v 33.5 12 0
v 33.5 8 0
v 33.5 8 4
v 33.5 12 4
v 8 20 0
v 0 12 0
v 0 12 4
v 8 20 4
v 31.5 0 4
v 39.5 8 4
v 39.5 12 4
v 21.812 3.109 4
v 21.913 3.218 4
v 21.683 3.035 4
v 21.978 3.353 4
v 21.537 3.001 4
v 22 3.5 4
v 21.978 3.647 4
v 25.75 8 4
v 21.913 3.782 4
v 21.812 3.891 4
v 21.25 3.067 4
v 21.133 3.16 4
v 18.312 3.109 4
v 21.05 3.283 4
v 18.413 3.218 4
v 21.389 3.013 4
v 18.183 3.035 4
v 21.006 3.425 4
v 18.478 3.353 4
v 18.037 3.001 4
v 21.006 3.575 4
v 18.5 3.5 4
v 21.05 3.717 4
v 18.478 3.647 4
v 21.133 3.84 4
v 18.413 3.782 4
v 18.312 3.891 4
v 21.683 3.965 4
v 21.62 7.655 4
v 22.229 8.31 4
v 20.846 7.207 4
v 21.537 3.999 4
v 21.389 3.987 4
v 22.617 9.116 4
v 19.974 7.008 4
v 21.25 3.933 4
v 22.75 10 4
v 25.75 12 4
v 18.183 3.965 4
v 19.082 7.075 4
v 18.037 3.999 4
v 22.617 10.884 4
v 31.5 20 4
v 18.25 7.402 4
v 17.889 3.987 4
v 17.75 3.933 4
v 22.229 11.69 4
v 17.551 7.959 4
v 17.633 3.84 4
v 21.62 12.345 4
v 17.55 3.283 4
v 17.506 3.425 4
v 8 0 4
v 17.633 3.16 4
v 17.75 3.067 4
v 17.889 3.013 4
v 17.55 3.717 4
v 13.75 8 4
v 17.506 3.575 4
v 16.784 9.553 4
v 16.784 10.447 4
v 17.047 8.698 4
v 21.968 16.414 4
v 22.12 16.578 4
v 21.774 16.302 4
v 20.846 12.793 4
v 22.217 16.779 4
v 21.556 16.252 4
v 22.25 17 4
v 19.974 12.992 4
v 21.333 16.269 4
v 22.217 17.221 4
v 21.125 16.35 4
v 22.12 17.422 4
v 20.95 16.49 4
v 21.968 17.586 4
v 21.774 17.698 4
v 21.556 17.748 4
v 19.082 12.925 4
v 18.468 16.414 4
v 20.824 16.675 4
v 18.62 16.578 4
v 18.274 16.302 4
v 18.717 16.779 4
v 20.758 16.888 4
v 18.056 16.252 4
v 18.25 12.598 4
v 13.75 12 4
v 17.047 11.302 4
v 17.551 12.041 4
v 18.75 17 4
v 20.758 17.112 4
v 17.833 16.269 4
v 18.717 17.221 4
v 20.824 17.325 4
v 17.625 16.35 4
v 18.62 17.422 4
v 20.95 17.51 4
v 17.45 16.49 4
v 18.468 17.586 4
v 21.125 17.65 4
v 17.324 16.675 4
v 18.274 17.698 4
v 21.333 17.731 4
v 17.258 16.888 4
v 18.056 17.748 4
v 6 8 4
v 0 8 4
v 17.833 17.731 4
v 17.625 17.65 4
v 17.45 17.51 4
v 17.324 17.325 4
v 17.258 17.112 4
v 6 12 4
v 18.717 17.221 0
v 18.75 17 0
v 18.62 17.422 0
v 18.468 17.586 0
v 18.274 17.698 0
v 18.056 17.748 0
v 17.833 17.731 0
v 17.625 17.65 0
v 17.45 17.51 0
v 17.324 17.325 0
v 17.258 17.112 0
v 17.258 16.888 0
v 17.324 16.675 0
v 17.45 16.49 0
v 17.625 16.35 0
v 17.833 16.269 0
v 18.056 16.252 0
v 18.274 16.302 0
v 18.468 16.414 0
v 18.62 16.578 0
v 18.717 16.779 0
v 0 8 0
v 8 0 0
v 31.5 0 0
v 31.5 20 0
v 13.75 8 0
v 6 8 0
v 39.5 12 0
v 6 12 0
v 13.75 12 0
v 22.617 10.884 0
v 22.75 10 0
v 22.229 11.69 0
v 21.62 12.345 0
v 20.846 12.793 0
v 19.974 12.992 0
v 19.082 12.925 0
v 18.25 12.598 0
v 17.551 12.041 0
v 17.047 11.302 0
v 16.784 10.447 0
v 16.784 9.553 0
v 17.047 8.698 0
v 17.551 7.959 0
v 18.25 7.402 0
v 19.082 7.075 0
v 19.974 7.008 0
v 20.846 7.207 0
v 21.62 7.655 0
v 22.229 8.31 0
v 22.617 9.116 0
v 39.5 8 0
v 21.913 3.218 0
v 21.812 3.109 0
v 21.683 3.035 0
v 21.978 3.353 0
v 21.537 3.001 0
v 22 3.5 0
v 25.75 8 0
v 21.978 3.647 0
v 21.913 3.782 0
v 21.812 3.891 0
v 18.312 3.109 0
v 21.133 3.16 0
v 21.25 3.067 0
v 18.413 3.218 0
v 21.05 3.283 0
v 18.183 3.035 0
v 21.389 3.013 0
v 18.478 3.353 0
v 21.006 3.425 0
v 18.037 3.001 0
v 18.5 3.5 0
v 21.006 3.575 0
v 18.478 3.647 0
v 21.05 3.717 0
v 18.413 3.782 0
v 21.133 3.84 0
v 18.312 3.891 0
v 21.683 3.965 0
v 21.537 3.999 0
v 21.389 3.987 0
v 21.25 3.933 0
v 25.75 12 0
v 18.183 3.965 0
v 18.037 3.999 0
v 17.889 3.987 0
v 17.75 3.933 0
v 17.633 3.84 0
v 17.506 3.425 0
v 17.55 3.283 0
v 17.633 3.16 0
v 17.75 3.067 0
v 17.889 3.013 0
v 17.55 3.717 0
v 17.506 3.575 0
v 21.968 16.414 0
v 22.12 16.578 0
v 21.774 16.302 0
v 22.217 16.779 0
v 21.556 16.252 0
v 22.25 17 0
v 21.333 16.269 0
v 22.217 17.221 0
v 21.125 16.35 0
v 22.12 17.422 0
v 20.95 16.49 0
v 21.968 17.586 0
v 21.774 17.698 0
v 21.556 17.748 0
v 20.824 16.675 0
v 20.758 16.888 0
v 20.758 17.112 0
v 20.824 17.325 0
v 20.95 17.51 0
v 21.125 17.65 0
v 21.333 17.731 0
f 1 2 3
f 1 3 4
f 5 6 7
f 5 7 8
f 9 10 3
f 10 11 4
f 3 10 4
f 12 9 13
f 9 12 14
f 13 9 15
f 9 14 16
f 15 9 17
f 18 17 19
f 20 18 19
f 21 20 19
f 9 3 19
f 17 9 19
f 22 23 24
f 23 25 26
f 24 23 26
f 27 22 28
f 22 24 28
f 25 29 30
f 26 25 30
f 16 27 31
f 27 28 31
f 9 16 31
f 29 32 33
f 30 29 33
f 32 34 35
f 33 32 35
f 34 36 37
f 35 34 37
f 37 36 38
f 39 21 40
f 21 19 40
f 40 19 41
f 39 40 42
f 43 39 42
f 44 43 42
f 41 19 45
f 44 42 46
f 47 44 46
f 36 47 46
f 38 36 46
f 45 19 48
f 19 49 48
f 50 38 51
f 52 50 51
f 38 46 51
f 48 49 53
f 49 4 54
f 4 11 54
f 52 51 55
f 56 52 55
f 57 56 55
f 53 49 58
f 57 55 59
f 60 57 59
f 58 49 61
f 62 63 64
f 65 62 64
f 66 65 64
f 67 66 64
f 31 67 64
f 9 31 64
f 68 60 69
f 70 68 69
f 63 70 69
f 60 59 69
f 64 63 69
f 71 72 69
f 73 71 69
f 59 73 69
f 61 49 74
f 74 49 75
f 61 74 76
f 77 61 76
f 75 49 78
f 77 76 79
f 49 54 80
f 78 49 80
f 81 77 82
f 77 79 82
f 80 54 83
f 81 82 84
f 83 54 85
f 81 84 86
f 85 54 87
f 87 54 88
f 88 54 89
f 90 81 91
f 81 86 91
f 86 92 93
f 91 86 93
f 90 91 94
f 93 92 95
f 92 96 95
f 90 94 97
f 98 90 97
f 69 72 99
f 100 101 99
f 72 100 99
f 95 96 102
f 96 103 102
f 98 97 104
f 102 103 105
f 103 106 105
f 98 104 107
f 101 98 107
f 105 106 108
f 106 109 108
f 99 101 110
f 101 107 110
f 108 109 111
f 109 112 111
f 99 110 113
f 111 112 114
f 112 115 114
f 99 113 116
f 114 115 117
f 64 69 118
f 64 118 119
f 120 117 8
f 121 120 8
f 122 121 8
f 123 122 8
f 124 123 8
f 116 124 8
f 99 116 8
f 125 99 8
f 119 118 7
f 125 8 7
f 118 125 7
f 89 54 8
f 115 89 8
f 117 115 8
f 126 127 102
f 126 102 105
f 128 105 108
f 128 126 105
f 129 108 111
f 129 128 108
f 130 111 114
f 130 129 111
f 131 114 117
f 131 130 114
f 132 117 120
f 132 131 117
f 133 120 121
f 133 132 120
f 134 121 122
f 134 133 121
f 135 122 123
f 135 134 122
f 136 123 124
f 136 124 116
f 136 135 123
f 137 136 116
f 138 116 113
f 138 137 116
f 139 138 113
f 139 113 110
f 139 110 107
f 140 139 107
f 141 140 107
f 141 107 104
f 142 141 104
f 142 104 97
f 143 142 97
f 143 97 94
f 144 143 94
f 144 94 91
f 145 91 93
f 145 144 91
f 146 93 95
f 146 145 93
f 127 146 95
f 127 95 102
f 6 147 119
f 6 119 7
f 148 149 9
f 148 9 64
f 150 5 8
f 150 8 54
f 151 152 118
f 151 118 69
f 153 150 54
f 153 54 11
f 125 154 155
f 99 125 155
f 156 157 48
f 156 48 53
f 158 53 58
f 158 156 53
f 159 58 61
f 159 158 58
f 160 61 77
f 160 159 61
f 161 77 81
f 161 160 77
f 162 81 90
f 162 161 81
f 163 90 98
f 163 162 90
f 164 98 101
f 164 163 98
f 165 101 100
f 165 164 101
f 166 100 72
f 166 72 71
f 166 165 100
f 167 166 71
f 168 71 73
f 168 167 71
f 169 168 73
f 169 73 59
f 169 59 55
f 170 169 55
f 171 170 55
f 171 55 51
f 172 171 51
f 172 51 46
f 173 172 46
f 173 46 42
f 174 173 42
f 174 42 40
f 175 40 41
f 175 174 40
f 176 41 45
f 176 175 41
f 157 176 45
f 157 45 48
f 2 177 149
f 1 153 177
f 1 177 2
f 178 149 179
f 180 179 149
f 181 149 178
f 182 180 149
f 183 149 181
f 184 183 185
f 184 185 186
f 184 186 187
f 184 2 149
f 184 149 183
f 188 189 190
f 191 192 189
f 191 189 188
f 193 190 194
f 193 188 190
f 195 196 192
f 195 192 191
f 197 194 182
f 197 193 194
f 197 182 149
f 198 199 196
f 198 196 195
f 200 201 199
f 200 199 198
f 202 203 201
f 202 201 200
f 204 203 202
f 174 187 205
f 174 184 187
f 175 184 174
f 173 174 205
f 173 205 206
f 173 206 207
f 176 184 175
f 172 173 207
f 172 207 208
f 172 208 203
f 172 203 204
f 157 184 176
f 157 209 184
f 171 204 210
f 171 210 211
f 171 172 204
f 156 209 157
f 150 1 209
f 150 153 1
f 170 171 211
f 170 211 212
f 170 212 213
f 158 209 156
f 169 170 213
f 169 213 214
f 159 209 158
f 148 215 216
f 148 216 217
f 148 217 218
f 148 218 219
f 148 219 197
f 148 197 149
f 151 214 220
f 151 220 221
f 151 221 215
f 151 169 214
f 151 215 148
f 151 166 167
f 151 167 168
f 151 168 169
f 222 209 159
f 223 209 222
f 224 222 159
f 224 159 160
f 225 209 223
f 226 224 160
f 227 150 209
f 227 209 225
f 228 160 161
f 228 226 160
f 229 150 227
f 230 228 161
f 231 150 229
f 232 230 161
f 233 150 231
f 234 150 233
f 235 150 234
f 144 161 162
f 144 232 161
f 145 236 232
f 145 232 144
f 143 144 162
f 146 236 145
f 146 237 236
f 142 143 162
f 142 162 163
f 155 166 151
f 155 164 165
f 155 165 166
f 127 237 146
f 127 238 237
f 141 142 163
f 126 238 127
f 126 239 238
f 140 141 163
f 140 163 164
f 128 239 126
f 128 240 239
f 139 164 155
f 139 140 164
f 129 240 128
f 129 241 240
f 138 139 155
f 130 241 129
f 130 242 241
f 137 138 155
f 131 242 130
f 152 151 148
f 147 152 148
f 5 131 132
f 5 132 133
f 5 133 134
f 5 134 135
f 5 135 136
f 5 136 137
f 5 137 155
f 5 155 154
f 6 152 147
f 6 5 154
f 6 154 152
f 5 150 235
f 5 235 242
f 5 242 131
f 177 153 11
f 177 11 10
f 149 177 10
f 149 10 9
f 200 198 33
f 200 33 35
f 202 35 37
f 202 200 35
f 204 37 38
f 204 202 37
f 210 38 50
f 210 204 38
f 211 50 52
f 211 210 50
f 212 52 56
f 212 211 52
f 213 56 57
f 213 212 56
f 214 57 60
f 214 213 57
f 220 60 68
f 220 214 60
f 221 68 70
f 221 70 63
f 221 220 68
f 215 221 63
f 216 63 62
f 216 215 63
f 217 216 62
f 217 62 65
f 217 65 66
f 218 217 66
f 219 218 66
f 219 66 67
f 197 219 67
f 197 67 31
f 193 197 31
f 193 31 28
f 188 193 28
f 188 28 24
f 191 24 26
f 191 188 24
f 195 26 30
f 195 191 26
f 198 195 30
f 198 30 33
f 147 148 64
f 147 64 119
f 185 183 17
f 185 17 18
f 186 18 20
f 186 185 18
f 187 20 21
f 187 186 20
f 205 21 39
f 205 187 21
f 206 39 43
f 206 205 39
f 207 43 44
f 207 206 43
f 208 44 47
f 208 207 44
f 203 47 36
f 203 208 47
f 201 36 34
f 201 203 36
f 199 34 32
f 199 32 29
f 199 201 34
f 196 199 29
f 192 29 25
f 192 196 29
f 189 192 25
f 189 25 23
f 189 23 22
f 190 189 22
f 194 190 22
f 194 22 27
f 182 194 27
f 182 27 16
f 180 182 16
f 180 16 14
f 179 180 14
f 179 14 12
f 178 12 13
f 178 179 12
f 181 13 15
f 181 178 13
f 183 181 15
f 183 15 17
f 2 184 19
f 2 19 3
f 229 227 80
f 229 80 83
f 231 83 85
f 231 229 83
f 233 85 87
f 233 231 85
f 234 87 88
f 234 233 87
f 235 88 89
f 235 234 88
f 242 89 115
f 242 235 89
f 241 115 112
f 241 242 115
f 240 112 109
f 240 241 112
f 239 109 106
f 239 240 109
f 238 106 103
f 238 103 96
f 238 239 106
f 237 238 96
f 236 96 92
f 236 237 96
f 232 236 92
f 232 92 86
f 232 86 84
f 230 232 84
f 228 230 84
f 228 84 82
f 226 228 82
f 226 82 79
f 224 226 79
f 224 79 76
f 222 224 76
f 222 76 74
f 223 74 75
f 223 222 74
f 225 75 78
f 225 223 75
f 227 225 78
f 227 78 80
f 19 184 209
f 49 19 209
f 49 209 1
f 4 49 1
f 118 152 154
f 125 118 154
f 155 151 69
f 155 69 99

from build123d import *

# Parameters (mm, degrees)
SKETCH1_R           = 3
SKETCH1_R_2         = 0.75
SKETCH1_R_3         = 0.5
SKETCH1_W           = 7.75
SKETCH1_H           = 4
BOSS_EXTRUDE1_DEPTH = 4


with BuildPart() as part:
    # Sketch1 → Boss-Extrude1 (new body)
    with BuildSketch(Plane.XY):
        Polygon((8.000003067, 19.999998036), (31.500003067, 19.999998036), (39.500003067, 11.999998036), (39.500003067, 7.999998036), (31.500003067, -1.964e-06), (8.000003067, -1.964e-06), (3.067e-06, 7.999998036), (3.067e-06, 11.999998036), align=None)
        with Locations((19.750003067, 9.999998036)):
            Circle(SKETCH1_R, mode=Mode.SUBTRACT)
        with Locations((18.000003067, 16.999998036)):
            Circle(SKETCH1_R_2, mode=Mode.SUBTRACT)
        with Locations((21.500003067, 16.999998036)):
            Circle(SKETCH1_R_2, mode=Mode.SUBTRACT)
        with Locations((18.000003067, 3.499998036)):
            Circle(SKETCH1_R_3, mode=Mode.SUBTRACT)
        with Locations((21.500003067, 3.499998036)):
            Circle(SKETCH1_R_3, mode=Mode.SUBTRACT)
        with Locations((9.875003067, 9.999998036)):
            Rectangle(SKETCH1_W, SKETCH1_H, mode=Mode.SUBTRACT)
        with Locations((29.625003067, 9.999998036)):
            Rectangle(SKETCH1_W, SKETCH1_H, mode=Mode.SUBTRACT)
    extrude(amount=BOSS_EXTRUDE1_DEPTH)


solid = part.part
